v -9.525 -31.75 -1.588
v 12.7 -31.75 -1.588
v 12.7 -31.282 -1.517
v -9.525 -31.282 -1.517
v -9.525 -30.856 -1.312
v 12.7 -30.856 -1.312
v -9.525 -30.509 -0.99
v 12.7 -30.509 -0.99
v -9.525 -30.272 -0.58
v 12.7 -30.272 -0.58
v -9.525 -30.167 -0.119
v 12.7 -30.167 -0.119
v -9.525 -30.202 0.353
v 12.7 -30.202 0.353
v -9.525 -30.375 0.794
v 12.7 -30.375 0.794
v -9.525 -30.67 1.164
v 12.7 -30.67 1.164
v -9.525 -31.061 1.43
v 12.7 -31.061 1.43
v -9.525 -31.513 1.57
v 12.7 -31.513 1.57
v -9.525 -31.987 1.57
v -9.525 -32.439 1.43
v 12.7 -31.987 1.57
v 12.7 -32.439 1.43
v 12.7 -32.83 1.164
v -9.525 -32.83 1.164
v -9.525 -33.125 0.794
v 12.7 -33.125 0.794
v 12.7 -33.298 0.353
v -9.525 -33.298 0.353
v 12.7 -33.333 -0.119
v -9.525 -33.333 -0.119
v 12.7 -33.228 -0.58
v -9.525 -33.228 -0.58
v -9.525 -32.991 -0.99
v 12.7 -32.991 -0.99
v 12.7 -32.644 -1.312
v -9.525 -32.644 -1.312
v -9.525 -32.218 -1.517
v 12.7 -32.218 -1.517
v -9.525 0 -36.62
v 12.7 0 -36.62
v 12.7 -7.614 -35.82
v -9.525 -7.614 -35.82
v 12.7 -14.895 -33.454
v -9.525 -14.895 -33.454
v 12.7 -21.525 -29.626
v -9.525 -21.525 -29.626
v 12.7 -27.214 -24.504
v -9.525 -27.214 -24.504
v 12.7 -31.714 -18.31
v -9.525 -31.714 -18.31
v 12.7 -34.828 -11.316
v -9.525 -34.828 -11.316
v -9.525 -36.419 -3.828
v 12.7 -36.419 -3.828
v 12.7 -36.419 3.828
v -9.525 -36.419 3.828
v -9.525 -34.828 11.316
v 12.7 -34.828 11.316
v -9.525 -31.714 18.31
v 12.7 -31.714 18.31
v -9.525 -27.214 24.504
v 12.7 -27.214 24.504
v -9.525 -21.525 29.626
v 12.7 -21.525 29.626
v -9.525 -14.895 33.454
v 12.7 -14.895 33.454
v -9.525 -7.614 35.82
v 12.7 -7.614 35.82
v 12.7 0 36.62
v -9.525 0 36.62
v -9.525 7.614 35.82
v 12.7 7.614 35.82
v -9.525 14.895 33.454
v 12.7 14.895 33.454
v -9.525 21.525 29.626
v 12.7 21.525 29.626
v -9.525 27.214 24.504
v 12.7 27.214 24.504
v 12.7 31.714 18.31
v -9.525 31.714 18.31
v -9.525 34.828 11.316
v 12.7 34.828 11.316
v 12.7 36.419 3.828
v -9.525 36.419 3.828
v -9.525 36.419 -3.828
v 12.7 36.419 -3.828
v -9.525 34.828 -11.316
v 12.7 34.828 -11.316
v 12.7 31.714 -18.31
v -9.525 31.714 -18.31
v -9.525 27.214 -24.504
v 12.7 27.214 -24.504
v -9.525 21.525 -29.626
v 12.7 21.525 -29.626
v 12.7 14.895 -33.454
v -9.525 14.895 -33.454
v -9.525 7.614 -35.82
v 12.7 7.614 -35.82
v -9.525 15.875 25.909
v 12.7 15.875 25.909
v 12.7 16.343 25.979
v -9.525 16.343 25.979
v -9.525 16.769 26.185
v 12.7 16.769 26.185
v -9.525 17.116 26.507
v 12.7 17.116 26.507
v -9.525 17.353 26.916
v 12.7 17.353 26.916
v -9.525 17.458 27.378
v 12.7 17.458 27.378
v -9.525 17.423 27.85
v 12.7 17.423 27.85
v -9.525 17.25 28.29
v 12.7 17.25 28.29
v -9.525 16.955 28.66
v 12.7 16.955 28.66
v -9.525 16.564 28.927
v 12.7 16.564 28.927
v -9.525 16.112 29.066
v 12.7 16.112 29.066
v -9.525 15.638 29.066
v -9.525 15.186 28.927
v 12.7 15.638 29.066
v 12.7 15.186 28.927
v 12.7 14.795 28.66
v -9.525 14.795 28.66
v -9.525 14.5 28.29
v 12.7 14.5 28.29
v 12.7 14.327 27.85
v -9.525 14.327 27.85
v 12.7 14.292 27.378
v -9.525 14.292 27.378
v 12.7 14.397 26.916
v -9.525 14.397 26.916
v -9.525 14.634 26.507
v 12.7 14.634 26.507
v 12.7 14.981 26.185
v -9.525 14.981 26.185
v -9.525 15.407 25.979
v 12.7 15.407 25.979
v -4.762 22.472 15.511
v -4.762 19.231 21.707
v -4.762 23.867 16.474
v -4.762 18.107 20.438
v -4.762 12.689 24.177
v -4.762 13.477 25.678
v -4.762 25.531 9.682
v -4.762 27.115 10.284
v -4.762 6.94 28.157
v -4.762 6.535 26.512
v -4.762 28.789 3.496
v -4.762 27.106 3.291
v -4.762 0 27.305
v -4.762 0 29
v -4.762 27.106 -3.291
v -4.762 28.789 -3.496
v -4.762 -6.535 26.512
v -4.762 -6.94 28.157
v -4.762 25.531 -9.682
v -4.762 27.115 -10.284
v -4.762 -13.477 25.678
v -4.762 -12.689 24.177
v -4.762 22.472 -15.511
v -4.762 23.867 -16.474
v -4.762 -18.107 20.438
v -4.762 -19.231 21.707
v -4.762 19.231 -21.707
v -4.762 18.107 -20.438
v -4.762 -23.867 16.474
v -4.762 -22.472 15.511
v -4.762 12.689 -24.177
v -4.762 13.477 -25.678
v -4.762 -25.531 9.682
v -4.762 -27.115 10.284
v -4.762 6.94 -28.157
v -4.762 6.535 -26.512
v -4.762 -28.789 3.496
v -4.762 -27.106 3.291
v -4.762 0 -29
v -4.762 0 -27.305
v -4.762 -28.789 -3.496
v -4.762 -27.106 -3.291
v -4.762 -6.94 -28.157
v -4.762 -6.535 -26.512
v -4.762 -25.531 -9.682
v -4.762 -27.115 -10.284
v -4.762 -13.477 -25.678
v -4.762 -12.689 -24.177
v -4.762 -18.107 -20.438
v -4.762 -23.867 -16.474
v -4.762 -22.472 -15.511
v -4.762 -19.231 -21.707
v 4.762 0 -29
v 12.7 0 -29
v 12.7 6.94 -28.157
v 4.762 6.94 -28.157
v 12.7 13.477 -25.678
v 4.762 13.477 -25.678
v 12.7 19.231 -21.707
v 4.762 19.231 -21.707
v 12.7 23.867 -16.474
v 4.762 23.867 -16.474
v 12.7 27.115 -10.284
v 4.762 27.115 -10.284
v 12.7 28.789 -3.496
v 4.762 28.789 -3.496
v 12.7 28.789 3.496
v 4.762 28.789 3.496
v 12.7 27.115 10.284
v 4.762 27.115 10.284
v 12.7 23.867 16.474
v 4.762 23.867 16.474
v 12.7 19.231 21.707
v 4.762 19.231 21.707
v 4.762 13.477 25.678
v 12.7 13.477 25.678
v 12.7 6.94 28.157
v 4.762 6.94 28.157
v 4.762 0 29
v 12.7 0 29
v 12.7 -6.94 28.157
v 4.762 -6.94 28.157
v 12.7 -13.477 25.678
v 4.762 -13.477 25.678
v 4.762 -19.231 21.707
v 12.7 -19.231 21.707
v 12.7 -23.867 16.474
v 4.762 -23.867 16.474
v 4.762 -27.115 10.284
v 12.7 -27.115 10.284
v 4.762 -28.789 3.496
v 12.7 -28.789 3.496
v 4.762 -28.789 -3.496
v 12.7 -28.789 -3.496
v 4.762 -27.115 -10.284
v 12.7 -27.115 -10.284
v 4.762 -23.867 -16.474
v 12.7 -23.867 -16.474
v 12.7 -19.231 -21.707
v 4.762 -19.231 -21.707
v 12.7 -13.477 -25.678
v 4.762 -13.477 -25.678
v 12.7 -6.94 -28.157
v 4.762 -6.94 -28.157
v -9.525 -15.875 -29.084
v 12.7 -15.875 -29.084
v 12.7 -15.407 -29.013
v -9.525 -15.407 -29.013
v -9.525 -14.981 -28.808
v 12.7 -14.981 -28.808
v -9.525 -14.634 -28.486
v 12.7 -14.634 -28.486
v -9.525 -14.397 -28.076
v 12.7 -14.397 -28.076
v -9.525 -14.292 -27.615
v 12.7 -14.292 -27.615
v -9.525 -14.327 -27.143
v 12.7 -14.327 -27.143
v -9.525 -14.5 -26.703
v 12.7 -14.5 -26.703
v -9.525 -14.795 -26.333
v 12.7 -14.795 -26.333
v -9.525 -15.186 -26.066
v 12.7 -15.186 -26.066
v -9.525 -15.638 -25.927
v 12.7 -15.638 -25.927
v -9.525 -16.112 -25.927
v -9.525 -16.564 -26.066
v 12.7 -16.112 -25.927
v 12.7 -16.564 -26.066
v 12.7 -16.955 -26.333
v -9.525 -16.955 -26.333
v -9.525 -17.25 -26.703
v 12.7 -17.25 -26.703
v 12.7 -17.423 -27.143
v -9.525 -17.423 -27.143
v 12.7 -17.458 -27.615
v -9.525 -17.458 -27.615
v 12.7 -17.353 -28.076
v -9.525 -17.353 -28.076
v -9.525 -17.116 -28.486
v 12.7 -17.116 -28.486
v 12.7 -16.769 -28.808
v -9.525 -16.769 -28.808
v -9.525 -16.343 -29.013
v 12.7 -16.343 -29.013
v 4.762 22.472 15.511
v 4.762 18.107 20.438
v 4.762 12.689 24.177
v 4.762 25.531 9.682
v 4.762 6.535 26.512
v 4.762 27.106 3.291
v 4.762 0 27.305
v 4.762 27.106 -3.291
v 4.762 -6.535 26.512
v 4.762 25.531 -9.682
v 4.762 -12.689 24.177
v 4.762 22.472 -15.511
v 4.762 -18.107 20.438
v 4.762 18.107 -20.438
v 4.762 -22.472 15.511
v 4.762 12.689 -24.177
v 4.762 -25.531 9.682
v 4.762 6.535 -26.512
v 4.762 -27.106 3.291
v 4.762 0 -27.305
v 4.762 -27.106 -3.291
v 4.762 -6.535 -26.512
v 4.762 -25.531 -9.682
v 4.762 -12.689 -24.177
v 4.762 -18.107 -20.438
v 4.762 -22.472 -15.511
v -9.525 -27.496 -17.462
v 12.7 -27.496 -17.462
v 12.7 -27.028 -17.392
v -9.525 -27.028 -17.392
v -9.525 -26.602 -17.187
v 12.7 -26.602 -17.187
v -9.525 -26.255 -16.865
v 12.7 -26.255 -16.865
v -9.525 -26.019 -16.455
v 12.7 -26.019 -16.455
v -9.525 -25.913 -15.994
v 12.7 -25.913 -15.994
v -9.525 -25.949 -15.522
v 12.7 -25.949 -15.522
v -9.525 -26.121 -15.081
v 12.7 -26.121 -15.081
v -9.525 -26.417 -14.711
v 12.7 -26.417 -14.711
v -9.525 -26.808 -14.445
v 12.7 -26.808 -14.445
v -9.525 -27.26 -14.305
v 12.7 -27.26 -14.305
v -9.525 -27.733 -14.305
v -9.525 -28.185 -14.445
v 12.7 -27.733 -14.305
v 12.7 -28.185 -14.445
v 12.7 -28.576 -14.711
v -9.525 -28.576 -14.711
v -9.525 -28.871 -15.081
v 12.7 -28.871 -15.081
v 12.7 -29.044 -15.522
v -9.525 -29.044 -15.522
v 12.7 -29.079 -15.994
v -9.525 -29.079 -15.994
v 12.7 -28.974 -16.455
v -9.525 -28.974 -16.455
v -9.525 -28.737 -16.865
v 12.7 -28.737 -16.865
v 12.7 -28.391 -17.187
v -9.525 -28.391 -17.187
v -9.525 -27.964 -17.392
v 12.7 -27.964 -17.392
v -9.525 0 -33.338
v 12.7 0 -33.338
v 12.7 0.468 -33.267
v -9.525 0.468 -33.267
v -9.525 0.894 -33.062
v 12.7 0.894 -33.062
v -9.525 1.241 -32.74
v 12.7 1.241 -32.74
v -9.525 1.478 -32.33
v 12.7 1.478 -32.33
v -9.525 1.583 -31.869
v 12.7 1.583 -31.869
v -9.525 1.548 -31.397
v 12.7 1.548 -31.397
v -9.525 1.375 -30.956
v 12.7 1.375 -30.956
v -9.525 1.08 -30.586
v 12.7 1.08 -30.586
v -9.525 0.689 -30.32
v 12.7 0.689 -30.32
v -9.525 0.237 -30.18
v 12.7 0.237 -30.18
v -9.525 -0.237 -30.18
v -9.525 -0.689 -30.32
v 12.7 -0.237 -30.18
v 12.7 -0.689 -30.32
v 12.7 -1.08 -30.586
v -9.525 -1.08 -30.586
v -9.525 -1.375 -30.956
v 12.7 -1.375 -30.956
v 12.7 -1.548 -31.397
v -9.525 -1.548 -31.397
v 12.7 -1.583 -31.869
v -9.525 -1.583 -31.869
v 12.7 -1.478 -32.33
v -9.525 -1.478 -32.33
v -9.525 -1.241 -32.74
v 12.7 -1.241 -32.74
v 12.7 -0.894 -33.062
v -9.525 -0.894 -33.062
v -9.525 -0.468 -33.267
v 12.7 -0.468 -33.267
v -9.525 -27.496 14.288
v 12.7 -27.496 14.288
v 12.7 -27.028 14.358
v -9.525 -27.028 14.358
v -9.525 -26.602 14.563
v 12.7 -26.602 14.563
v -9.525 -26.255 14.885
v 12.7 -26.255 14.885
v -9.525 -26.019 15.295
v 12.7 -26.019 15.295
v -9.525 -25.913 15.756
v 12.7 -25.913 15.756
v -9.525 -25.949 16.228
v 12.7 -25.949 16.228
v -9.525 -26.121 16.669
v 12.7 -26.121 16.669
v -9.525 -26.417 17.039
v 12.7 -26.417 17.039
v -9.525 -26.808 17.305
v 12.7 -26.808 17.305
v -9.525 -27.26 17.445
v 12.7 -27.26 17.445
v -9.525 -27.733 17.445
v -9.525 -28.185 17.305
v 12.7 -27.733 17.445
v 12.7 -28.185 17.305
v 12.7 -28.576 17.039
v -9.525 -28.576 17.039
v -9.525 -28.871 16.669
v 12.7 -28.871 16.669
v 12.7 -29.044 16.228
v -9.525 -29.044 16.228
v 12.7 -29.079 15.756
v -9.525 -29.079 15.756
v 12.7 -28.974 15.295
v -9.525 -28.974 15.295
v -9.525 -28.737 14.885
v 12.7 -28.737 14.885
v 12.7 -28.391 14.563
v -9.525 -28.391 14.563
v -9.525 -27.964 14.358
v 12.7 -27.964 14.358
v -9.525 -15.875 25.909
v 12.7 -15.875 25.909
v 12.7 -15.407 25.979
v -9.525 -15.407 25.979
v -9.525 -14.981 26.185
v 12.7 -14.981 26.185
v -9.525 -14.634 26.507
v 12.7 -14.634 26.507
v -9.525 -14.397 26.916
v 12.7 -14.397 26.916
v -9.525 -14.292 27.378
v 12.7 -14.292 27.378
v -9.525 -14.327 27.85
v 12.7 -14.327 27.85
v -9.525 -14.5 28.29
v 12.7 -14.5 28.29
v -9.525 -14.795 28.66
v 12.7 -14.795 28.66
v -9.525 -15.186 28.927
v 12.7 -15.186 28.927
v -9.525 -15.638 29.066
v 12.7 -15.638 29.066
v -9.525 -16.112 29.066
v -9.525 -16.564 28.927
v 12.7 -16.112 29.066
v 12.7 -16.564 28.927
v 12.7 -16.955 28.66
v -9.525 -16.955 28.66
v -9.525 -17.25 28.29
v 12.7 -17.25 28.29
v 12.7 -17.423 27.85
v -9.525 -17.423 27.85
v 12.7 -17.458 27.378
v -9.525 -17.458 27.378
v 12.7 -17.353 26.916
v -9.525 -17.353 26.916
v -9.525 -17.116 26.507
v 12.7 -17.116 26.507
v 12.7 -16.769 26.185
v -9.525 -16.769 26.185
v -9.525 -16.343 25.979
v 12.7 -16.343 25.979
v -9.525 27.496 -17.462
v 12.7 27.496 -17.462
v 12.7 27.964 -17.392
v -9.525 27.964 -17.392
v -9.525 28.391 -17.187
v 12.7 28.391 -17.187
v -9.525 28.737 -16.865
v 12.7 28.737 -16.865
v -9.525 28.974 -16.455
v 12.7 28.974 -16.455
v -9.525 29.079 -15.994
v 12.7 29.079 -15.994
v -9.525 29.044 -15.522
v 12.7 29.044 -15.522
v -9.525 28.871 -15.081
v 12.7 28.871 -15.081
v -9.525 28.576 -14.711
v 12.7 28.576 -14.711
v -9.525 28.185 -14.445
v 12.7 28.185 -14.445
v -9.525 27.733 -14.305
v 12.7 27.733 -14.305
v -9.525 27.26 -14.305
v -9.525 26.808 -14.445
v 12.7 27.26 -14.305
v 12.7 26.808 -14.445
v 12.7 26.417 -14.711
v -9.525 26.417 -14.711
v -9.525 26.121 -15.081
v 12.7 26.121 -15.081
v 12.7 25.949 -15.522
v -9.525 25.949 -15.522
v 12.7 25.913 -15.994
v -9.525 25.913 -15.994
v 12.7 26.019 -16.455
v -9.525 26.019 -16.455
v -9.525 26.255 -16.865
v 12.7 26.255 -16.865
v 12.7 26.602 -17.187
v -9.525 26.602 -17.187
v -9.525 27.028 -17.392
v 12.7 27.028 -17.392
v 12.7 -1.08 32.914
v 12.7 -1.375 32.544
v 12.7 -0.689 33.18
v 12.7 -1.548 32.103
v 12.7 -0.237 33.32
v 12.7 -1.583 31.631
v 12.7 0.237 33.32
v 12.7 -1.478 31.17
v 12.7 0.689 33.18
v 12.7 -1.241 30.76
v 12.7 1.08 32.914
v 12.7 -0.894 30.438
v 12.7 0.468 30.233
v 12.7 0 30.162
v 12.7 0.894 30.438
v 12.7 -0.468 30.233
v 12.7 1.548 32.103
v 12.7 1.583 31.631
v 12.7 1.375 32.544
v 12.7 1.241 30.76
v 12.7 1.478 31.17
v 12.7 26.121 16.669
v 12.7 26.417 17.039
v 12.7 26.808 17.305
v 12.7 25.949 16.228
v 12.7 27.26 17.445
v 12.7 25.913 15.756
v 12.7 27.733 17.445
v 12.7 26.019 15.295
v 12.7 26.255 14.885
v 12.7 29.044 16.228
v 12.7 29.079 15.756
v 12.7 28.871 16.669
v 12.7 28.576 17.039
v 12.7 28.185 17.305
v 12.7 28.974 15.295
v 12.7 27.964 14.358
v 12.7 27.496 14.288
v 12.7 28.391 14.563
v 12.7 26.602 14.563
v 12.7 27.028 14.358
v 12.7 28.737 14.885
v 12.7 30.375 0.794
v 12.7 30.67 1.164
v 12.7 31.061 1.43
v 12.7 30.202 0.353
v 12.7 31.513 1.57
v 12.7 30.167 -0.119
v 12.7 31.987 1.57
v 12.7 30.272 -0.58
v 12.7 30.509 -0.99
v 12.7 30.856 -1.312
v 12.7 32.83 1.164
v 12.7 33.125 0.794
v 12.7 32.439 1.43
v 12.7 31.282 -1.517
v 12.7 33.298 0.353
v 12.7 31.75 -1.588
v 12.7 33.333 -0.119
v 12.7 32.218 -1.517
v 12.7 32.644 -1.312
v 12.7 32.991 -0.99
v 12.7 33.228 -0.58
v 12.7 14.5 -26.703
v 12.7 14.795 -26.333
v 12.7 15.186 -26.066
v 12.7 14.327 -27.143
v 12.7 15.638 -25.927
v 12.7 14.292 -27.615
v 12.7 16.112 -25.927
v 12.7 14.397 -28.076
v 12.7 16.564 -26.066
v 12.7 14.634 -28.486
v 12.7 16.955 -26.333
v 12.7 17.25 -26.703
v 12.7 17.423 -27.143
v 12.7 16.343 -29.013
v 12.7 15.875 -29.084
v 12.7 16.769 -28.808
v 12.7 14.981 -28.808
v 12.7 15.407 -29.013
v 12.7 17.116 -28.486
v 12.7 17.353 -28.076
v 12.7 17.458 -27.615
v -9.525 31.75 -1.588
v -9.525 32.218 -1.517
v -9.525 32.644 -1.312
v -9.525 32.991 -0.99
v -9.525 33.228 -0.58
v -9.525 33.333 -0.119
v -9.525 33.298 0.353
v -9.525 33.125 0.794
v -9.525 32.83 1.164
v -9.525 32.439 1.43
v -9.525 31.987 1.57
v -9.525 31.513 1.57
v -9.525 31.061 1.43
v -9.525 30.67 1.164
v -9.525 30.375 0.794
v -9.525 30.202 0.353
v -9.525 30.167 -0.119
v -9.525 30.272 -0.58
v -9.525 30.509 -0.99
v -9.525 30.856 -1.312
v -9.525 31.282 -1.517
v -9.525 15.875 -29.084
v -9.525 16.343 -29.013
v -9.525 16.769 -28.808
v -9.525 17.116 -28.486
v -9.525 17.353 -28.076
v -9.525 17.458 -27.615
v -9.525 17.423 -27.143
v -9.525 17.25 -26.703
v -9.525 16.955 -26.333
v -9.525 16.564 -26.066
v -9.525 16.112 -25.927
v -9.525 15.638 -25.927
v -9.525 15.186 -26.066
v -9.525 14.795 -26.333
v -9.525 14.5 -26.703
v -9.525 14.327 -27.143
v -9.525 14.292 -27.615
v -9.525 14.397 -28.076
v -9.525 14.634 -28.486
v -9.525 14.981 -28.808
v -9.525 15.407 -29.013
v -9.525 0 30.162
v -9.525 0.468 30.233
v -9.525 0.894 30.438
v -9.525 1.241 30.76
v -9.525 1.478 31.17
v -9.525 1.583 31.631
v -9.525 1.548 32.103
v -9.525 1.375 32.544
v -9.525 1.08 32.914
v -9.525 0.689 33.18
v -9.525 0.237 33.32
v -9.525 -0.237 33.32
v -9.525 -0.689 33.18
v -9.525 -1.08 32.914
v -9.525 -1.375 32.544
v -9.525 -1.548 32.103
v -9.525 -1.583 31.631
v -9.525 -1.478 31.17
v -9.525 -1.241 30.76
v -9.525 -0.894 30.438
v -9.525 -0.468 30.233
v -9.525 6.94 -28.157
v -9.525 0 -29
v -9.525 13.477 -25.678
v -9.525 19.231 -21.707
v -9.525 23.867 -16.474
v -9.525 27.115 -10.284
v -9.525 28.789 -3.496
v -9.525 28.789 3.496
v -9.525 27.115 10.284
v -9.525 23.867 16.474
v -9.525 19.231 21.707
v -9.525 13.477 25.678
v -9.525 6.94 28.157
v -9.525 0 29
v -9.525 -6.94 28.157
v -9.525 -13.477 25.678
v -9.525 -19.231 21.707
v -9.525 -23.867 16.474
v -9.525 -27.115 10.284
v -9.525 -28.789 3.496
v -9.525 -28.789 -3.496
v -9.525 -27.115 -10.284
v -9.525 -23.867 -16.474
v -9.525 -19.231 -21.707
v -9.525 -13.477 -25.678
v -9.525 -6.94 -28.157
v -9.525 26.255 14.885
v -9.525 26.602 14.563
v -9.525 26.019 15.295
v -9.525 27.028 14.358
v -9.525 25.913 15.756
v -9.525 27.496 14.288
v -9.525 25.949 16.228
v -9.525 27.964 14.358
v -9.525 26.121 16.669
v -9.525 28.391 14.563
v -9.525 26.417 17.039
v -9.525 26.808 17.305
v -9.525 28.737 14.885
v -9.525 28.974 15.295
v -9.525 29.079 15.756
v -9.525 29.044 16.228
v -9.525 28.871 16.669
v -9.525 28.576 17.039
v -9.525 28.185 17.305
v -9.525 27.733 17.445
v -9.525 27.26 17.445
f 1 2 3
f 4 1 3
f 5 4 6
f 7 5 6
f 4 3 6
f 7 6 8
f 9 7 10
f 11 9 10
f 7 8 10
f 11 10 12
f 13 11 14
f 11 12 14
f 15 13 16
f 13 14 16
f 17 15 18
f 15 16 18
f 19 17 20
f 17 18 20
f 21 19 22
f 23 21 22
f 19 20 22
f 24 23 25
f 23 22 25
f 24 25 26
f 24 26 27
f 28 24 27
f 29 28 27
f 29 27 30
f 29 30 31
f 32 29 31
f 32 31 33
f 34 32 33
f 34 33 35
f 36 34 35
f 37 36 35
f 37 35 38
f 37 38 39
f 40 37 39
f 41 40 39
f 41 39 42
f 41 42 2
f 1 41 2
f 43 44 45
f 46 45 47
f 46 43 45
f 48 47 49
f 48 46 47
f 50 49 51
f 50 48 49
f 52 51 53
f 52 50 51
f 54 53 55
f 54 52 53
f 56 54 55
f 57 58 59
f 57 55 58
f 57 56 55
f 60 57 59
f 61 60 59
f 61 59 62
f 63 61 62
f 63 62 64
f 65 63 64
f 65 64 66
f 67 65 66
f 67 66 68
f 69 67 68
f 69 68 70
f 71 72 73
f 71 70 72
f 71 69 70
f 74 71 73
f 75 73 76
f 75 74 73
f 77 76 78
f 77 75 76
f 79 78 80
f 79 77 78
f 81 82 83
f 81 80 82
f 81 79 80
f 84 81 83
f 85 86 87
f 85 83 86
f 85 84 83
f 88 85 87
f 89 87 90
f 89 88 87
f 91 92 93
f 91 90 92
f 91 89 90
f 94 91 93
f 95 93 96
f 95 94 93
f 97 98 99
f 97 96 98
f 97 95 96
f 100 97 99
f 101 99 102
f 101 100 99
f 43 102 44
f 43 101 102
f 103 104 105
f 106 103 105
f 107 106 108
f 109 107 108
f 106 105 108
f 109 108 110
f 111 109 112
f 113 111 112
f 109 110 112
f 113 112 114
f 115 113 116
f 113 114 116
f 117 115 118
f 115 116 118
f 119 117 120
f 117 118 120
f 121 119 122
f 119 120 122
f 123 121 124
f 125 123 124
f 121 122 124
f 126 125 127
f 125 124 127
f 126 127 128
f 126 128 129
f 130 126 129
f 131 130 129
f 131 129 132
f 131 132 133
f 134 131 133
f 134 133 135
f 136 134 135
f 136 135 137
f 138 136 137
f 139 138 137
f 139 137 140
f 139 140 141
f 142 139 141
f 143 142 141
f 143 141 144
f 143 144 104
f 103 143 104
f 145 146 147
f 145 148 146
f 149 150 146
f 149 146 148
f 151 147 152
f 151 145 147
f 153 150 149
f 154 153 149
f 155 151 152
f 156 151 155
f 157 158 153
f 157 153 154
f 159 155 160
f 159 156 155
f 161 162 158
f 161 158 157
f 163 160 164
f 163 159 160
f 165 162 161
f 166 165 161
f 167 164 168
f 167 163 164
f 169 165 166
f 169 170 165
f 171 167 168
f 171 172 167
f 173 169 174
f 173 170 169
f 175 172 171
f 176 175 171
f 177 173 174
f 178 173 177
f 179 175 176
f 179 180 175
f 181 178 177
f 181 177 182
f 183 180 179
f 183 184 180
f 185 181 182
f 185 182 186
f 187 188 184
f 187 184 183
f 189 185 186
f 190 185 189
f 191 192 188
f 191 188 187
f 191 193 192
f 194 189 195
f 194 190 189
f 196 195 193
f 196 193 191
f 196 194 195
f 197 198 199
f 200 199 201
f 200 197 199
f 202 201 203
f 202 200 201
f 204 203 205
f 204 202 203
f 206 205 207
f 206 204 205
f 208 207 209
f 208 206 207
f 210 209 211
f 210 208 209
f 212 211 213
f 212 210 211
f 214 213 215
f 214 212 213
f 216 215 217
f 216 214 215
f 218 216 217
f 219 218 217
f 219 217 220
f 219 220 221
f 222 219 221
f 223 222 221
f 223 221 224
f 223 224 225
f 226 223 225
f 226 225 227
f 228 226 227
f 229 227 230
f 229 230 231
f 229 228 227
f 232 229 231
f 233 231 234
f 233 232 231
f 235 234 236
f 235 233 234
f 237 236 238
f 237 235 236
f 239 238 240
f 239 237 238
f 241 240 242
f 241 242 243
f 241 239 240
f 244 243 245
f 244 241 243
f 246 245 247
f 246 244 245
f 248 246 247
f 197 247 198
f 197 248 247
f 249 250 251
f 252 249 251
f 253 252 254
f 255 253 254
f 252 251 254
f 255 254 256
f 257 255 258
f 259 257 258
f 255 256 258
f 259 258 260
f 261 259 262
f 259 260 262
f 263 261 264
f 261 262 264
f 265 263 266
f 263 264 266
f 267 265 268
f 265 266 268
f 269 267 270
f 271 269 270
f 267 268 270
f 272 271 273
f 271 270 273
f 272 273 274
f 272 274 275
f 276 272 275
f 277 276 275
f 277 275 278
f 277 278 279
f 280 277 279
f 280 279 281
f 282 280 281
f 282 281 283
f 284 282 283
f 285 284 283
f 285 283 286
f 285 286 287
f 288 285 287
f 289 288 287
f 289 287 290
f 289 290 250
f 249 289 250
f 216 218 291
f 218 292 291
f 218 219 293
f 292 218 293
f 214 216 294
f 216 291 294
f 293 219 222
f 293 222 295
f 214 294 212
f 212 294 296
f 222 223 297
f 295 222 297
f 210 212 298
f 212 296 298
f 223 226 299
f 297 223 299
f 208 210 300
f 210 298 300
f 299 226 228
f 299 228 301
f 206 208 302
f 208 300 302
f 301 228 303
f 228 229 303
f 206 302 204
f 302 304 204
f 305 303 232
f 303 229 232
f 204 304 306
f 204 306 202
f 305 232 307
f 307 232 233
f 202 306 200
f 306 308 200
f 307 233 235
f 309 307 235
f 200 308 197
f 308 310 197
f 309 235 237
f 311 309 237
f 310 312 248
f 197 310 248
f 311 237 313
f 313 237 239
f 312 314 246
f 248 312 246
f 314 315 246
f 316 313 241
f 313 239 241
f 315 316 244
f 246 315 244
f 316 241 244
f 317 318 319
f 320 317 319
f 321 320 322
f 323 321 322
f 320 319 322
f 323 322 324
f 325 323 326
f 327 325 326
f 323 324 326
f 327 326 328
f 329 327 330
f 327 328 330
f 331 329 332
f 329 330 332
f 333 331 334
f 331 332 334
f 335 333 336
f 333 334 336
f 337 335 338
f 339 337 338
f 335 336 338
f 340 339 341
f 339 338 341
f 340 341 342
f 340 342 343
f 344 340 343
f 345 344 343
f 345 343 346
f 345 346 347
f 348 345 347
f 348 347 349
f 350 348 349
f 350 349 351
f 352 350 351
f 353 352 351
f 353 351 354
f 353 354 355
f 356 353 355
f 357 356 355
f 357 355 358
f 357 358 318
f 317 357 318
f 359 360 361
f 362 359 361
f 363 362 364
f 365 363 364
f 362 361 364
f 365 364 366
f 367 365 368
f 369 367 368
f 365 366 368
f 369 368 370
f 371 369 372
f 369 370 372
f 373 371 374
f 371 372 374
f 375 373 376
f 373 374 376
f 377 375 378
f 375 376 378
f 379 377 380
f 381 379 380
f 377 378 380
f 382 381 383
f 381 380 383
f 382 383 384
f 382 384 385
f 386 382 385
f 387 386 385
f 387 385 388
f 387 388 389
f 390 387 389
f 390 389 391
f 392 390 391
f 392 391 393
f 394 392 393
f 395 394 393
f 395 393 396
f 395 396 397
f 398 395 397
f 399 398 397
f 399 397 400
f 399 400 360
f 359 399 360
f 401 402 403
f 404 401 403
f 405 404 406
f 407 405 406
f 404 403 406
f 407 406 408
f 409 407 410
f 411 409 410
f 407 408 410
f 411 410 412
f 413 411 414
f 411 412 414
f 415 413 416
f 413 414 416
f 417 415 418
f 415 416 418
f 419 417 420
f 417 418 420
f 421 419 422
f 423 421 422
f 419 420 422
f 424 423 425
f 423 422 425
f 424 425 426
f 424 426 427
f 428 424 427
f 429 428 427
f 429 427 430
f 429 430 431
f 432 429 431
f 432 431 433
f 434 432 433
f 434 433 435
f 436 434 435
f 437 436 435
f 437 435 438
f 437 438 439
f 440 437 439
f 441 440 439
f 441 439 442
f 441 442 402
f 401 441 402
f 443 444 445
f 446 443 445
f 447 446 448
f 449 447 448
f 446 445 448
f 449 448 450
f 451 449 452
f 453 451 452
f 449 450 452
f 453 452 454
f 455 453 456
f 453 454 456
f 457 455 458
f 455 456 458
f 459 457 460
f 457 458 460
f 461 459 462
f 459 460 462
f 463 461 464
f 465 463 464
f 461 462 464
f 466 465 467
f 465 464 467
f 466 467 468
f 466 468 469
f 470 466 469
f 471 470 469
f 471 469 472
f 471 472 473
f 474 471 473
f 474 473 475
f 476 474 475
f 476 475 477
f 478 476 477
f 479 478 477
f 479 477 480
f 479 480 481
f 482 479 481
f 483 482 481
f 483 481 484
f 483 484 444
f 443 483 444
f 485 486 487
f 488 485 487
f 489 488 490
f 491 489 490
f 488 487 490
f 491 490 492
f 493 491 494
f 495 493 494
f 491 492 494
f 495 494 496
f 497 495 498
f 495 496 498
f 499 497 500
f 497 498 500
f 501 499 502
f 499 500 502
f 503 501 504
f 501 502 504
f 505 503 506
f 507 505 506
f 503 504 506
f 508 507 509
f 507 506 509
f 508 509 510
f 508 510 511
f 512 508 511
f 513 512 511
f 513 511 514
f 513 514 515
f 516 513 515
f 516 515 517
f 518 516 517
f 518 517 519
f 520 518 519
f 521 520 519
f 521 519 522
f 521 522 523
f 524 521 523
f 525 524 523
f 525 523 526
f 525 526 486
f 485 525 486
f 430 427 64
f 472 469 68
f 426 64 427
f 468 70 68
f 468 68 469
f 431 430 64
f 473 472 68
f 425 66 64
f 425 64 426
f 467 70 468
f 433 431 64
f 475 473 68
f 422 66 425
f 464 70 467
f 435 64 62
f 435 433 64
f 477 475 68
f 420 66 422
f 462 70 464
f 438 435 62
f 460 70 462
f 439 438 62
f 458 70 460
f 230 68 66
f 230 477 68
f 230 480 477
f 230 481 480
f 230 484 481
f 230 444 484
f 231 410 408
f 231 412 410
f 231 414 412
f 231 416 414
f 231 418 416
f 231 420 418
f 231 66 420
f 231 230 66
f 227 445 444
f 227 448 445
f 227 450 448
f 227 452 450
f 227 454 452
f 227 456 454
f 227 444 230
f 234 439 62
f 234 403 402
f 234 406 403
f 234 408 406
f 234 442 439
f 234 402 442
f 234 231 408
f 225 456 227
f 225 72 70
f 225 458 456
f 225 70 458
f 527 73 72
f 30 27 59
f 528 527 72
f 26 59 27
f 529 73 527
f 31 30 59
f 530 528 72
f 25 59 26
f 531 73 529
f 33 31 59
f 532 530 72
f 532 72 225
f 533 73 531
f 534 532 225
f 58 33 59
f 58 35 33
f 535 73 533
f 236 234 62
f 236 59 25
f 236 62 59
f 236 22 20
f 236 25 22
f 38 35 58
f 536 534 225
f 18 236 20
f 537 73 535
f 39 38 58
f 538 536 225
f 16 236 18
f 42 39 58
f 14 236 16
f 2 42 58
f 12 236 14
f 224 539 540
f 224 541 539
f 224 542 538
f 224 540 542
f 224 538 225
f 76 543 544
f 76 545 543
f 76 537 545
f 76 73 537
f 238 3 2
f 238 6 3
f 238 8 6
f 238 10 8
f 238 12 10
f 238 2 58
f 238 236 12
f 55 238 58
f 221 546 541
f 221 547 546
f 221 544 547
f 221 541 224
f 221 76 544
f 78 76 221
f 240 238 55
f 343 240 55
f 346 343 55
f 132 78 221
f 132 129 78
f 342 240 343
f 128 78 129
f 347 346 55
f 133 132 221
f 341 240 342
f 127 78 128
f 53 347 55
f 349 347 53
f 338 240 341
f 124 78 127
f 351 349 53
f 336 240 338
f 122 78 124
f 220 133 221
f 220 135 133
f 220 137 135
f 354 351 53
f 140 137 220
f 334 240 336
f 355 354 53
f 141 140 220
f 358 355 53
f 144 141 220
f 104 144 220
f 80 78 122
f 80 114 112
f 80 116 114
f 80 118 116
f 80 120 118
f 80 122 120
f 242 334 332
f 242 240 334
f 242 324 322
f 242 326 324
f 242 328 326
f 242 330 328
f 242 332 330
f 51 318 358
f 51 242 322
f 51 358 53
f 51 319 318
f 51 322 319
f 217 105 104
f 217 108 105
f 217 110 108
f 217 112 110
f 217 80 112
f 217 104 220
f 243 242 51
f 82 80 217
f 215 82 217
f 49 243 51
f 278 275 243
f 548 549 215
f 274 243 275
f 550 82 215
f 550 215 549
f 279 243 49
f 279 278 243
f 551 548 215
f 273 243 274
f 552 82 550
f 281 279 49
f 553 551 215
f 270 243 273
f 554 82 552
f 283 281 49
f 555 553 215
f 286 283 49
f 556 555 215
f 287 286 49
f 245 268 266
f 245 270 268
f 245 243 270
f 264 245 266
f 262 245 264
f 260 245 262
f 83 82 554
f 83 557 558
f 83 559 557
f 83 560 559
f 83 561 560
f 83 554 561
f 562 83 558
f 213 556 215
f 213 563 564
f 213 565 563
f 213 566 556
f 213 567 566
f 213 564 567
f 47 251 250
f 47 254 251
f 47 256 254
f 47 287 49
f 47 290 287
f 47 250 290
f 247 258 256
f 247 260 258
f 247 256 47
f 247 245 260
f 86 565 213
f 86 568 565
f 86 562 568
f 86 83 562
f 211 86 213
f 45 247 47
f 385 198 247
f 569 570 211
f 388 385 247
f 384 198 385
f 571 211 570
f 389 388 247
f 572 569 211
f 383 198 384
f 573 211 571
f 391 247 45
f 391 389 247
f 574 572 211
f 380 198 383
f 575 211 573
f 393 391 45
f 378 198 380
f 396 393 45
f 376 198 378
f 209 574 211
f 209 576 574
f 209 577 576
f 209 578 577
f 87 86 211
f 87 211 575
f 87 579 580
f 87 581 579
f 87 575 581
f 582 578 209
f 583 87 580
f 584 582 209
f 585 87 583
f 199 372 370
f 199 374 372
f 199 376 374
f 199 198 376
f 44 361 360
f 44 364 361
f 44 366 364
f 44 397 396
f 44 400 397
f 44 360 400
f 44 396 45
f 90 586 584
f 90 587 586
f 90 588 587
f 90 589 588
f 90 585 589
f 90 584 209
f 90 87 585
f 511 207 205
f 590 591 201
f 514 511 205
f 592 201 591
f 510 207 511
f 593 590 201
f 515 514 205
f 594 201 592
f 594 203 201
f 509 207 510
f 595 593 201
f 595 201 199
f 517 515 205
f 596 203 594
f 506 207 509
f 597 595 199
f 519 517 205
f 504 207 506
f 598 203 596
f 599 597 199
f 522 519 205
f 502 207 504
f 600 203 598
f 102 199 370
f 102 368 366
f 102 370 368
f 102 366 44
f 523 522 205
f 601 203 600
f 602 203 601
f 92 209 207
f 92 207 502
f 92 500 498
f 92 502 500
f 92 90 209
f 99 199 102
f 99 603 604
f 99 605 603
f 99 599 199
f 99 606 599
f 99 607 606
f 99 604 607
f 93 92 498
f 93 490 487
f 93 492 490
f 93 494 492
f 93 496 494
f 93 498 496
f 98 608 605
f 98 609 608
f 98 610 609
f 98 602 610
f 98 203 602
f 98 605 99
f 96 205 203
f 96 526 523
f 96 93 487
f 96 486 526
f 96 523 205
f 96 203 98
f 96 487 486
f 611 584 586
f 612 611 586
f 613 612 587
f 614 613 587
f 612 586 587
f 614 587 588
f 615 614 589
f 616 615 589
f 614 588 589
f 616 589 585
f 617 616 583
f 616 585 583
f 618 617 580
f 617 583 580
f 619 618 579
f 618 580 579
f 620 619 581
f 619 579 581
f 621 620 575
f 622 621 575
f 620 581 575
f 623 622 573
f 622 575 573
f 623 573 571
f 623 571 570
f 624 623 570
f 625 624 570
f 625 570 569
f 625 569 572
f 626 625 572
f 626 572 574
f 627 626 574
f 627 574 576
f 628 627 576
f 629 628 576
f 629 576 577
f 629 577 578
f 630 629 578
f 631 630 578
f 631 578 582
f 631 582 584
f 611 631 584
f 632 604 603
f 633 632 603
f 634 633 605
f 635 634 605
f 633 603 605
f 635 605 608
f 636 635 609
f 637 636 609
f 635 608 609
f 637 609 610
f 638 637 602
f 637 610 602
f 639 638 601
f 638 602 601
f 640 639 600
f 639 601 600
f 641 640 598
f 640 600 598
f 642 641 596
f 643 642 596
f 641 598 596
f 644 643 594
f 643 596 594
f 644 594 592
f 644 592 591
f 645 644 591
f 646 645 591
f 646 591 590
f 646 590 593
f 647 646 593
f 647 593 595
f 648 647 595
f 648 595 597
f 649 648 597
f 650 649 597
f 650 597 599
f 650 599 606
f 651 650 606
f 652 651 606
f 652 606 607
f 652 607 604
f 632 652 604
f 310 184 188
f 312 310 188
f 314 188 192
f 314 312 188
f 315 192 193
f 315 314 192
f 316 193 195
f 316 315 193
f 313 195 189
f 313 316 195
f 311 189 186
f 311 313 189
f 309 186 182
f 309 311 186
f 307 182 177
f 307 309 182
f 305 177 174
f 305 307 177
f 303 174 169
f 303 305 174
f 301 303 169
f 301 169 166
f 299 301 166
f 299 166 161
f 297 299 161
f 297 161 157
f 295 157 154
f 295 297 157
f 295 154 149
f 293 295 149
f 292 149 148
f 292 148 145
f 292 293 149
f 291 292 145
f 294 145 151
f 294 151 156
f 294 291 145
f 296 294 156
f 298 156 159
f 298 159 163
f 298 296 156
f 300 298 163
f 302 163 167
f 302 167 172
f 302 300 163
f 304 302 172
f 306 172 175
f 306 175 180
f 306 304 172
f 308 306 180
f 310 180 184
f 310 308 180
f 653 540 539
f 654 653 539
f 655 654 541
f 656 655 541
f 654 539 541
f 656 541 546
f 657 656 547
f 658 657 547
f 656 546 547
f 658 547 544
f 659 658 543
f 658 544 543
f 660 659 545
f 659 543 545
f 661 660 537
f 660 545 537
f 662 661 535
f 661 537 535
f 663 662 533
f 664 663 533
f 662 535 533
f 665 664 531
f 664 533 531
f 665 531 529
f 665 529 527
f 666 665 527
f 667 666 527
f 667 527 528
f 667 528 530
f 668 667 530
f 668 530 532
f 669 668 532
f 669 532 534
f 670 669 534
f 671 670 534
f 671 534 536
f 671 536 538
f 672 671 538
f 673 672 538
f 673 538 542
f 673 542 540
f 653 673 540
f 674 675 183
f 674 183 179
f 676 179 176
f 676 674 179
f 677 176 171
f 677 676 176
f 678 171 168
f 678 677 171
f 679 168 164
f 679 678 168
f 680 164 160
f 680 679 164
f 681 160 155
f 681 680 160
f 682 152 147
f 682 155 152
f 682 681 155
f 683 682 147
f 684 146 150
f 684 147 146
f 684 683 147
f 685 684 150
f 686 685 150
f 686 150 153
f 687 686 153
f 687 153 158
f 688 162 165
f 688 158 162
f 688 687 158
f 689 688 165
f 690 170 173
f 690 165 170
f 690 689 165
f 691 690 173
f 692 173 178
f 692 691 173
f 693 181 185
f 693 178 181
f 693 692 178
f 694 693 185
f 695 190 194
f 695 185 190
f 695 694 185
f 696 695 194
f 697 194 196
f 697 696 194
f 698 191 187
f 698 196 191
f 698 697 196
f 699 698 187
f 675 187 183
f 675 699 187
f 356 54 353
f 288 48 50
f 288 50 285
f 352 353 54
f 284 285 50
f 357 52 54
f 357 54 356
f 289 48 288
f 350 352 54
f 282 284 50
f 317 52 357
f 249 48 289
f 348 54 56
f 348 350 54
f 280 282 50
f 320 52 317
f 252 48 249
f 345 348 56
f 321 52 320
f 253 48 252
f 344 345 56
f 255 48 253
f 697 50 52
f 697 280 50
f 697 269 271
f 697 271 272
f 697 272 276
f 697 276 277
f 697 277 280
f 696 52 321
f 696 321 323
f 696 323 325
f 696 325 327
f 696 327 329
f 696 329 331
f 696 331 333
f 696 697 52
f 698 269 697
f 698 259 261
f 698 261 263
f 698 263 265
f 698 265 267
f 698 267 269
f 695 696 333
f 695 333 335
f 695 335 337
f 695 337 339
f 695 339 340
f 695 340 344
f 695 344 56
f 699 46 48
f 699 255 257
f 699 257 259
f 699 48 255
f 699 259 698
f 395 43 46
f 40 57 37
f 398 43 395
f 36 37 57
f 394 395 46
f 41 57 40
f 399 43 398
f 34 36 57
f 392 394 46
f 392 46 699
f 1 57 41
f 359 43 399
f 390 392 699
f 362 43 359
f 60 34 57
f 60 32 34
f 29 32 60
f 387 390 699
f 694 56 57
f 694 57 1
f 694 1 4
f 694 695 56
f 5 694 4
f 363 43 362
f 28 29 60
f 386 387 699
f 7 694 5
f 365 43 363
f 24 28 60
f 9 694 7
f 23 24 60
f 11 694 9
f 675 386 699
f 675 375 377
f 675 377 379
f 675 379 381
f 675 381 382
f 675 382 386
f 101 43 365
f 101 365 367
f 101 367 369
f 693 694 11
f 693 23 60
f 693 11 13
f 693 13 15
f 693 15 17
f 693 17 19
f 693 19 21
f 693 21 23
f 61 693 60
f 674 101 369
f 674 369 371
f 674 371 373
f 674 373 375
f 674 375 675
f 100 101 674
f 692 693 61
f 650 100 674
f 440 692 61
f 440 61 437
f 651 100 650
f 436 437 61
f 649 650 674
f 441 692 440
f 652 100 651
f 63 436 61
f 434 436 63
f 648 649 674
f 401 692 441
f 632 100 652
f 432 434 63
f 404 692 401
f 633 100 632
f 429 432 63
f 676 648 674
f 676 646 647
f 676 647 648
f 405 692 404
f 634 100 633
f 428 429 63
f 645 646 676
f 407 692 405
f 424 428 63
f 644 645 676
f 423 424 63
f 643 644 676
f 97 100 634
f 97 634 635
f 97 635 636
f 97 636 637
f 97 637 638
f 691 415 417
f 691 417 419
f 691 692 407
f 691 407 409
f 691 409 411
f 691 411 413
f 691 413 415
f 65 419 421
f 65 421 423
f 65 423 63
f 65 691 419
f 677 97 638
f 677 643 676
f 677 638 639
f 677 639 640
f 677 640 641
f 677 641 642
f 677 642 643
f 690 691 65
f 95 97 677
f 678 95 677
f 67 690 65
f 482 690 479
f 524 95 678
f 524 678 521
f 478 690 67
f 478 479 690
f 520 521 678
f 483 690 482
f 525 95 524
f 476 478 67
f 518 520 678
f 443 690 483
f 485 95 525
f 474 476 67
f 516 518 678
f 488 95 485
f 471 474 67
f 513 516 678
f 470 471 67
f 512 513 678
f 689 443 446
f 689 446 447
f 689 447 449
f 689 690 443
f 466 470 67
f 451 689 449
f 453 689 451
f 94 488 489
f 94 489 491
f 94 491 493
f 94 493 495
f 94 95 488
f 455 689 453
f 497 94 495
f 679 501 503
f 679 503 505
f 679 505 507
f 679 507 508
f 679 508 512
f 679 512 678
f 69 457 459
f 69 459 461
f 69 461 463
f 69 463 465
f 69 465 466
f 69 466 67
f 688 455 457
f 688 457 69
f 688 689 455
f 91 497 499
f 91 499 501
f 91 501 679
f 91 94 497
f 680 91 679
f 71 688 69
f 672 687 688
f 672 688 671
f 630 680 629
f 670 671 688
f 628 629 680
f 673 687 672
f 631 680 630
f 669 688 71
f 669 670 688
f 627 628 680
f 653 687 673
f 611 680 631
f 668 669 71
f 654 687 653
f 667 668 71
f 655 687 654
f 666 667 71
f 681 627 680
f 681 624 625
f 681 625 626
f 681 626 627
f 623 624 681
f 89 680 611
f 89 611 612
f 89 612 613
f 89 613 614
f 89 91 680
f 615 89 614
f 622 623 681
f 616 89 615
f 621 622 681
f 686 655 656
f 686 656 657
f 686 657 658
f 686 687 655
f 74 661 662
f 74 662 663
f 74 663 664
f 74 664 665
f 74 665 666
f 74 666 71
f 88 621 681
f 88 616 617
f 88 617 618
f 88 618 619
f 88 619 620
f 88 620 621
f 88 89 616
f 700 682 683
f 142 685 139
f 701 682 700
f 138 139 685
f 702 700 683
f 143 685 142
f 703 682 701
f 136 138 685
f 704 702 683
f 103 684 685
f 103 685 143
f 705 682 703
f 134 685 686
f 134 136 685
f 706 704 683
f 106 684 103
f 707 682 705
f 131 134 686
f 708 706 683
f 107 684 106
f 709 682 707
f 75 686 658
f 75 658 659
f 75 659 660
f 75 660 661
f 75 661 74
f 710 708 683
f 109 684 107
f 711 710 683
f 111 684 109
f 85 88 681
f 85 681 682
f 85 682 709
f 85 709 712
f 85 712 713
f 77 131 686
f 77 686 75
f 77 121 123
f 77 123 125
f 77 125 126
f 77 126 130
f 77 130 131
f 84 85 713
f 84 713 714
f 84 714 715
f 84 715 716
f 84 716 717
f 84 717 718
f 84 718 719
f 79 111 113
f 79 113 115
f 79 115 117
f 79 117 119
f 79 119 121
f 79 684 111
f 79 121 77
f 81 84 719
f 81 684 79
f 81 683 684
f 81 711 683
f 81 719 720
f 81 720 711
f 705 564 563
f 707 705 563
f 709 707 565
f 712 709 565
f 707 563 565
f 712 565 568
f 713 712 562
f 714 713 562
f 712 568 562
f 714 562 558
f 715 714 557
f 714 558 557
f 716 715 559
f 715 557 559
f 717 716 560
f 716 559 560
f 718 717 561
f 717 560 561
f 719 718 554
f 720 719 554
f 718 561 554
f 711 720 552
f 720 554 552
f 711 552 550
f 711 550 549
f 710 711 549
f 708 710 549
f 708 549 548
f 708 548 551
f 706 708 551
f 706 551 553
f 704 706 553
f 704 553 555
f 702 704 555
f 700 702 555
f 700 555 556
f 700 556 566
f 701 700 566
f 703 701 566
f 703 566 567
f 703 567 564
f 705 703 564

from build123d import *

# Parameters (mm, degrees)
SKETCH2_R           = 36.62
SKETCH2_R_2         = 29
BOSS_EXTRUDE1_DEPTH = 12.7
BOSS_EXTRUDE2_START = -12.7
SKETCH4_R           = 36.62
SKETCH4_R_2         = 27.305
BOSS_EXTRUDE2_DEPTH = 4.7625
SKETCH5_R           = 1.5875
CUT_EXTRUDE2_DEPTH  = 58.681962519
SKETCH6_R           = 63.5
CUT_EXTRUDE3_DEPTH  = 3.175


with BuildPart() as part:
    # Sketch2 → Boss-Extrude1 (new, symmetric)
    with BuildSketch(Plane(origin=(0, 0, 0), x_dir=(0, 0, -1), z_dir=(1, 0, 0))):
        Circle(SKETCH2_R)
        Circle(SKETCH2_R_2, mode=Mode.SUBTRACT)
    extrude(amount=BOSS_EXTRUDE1_DEPTH, both=True)

    # Sketch4 → Boss-Extrude2 (add, symmetric)
    with BuildSketch(Plane.ZY.offset(12.7).offset(BOSS_EXTRUDE2_START)):
        with Locations(Location((0, 0, 0), (0, 0, 180))):
            Circle(SKETCH4_R)
        with Locations(Location((0, 0, 0), (0, 0, 180))):
            Circle(SKETCH4_R_2, mode=Mode.SUBTRACT)
    extrude(amount=BOSS_EXTRUDE2_DEPTH, both=True)

    # Sketch5 → Cut-Extrude2 (cut, through all)
    with BuildSketch(Plane(origin=(12.7, 0, 0), x_dir=(0, 0, -1), z_dir=(1, 0, 0))):
        with Locations((31.75, 0)):
            Circle(SKETCH5_R)
        with Locations((27.49630657, -15.875)):
            Circle(SKETCH5_R)
        with Locations((15.875, -27.49630657)):
            Circle(SKETCH5_R)
        with Locations((0, -31.75)):
            Circle(SKETCH5_R)
        with Locations((-15.875, -27.49630657)):
            Circle(SKETCH5_R)
        with Locations((-27.49630657, -15.875)):
            Circle(SKETCH5_R)
        with Locations((-31.75, 0)):
            Circle(SKETCH5_R)
        with Locations((-27.49630657, 15.875)):
            Circle(SKETCH5_R)
        with Locations((-15.875, 27.49630657)):
            Circle(SKETCH5_R)
        with Locations((0, 31.75)):
            Circle(SKETCH5_R)
        with Locations((15.875, 27.49630657)):
            Circle(SKETCH5_R)
        with Locations((27.49630657, 15.875)):
            Circle(SKETCH5_R)
    extrude(amount=-CUT_EXTRUDE2_DEPTH, mode=Mode.SUBTRACT)

    # Sketch6 → Cut-Extrude3 (cut)
    with BuildSketch(Plane.ZY.offset(12.7)):
        Circle(SKETCH6_R)
    extrude(amount=-CUT_EXTRUDE3_DEPTH, mode=Mode.SUBTRACT)


solid = part.part
